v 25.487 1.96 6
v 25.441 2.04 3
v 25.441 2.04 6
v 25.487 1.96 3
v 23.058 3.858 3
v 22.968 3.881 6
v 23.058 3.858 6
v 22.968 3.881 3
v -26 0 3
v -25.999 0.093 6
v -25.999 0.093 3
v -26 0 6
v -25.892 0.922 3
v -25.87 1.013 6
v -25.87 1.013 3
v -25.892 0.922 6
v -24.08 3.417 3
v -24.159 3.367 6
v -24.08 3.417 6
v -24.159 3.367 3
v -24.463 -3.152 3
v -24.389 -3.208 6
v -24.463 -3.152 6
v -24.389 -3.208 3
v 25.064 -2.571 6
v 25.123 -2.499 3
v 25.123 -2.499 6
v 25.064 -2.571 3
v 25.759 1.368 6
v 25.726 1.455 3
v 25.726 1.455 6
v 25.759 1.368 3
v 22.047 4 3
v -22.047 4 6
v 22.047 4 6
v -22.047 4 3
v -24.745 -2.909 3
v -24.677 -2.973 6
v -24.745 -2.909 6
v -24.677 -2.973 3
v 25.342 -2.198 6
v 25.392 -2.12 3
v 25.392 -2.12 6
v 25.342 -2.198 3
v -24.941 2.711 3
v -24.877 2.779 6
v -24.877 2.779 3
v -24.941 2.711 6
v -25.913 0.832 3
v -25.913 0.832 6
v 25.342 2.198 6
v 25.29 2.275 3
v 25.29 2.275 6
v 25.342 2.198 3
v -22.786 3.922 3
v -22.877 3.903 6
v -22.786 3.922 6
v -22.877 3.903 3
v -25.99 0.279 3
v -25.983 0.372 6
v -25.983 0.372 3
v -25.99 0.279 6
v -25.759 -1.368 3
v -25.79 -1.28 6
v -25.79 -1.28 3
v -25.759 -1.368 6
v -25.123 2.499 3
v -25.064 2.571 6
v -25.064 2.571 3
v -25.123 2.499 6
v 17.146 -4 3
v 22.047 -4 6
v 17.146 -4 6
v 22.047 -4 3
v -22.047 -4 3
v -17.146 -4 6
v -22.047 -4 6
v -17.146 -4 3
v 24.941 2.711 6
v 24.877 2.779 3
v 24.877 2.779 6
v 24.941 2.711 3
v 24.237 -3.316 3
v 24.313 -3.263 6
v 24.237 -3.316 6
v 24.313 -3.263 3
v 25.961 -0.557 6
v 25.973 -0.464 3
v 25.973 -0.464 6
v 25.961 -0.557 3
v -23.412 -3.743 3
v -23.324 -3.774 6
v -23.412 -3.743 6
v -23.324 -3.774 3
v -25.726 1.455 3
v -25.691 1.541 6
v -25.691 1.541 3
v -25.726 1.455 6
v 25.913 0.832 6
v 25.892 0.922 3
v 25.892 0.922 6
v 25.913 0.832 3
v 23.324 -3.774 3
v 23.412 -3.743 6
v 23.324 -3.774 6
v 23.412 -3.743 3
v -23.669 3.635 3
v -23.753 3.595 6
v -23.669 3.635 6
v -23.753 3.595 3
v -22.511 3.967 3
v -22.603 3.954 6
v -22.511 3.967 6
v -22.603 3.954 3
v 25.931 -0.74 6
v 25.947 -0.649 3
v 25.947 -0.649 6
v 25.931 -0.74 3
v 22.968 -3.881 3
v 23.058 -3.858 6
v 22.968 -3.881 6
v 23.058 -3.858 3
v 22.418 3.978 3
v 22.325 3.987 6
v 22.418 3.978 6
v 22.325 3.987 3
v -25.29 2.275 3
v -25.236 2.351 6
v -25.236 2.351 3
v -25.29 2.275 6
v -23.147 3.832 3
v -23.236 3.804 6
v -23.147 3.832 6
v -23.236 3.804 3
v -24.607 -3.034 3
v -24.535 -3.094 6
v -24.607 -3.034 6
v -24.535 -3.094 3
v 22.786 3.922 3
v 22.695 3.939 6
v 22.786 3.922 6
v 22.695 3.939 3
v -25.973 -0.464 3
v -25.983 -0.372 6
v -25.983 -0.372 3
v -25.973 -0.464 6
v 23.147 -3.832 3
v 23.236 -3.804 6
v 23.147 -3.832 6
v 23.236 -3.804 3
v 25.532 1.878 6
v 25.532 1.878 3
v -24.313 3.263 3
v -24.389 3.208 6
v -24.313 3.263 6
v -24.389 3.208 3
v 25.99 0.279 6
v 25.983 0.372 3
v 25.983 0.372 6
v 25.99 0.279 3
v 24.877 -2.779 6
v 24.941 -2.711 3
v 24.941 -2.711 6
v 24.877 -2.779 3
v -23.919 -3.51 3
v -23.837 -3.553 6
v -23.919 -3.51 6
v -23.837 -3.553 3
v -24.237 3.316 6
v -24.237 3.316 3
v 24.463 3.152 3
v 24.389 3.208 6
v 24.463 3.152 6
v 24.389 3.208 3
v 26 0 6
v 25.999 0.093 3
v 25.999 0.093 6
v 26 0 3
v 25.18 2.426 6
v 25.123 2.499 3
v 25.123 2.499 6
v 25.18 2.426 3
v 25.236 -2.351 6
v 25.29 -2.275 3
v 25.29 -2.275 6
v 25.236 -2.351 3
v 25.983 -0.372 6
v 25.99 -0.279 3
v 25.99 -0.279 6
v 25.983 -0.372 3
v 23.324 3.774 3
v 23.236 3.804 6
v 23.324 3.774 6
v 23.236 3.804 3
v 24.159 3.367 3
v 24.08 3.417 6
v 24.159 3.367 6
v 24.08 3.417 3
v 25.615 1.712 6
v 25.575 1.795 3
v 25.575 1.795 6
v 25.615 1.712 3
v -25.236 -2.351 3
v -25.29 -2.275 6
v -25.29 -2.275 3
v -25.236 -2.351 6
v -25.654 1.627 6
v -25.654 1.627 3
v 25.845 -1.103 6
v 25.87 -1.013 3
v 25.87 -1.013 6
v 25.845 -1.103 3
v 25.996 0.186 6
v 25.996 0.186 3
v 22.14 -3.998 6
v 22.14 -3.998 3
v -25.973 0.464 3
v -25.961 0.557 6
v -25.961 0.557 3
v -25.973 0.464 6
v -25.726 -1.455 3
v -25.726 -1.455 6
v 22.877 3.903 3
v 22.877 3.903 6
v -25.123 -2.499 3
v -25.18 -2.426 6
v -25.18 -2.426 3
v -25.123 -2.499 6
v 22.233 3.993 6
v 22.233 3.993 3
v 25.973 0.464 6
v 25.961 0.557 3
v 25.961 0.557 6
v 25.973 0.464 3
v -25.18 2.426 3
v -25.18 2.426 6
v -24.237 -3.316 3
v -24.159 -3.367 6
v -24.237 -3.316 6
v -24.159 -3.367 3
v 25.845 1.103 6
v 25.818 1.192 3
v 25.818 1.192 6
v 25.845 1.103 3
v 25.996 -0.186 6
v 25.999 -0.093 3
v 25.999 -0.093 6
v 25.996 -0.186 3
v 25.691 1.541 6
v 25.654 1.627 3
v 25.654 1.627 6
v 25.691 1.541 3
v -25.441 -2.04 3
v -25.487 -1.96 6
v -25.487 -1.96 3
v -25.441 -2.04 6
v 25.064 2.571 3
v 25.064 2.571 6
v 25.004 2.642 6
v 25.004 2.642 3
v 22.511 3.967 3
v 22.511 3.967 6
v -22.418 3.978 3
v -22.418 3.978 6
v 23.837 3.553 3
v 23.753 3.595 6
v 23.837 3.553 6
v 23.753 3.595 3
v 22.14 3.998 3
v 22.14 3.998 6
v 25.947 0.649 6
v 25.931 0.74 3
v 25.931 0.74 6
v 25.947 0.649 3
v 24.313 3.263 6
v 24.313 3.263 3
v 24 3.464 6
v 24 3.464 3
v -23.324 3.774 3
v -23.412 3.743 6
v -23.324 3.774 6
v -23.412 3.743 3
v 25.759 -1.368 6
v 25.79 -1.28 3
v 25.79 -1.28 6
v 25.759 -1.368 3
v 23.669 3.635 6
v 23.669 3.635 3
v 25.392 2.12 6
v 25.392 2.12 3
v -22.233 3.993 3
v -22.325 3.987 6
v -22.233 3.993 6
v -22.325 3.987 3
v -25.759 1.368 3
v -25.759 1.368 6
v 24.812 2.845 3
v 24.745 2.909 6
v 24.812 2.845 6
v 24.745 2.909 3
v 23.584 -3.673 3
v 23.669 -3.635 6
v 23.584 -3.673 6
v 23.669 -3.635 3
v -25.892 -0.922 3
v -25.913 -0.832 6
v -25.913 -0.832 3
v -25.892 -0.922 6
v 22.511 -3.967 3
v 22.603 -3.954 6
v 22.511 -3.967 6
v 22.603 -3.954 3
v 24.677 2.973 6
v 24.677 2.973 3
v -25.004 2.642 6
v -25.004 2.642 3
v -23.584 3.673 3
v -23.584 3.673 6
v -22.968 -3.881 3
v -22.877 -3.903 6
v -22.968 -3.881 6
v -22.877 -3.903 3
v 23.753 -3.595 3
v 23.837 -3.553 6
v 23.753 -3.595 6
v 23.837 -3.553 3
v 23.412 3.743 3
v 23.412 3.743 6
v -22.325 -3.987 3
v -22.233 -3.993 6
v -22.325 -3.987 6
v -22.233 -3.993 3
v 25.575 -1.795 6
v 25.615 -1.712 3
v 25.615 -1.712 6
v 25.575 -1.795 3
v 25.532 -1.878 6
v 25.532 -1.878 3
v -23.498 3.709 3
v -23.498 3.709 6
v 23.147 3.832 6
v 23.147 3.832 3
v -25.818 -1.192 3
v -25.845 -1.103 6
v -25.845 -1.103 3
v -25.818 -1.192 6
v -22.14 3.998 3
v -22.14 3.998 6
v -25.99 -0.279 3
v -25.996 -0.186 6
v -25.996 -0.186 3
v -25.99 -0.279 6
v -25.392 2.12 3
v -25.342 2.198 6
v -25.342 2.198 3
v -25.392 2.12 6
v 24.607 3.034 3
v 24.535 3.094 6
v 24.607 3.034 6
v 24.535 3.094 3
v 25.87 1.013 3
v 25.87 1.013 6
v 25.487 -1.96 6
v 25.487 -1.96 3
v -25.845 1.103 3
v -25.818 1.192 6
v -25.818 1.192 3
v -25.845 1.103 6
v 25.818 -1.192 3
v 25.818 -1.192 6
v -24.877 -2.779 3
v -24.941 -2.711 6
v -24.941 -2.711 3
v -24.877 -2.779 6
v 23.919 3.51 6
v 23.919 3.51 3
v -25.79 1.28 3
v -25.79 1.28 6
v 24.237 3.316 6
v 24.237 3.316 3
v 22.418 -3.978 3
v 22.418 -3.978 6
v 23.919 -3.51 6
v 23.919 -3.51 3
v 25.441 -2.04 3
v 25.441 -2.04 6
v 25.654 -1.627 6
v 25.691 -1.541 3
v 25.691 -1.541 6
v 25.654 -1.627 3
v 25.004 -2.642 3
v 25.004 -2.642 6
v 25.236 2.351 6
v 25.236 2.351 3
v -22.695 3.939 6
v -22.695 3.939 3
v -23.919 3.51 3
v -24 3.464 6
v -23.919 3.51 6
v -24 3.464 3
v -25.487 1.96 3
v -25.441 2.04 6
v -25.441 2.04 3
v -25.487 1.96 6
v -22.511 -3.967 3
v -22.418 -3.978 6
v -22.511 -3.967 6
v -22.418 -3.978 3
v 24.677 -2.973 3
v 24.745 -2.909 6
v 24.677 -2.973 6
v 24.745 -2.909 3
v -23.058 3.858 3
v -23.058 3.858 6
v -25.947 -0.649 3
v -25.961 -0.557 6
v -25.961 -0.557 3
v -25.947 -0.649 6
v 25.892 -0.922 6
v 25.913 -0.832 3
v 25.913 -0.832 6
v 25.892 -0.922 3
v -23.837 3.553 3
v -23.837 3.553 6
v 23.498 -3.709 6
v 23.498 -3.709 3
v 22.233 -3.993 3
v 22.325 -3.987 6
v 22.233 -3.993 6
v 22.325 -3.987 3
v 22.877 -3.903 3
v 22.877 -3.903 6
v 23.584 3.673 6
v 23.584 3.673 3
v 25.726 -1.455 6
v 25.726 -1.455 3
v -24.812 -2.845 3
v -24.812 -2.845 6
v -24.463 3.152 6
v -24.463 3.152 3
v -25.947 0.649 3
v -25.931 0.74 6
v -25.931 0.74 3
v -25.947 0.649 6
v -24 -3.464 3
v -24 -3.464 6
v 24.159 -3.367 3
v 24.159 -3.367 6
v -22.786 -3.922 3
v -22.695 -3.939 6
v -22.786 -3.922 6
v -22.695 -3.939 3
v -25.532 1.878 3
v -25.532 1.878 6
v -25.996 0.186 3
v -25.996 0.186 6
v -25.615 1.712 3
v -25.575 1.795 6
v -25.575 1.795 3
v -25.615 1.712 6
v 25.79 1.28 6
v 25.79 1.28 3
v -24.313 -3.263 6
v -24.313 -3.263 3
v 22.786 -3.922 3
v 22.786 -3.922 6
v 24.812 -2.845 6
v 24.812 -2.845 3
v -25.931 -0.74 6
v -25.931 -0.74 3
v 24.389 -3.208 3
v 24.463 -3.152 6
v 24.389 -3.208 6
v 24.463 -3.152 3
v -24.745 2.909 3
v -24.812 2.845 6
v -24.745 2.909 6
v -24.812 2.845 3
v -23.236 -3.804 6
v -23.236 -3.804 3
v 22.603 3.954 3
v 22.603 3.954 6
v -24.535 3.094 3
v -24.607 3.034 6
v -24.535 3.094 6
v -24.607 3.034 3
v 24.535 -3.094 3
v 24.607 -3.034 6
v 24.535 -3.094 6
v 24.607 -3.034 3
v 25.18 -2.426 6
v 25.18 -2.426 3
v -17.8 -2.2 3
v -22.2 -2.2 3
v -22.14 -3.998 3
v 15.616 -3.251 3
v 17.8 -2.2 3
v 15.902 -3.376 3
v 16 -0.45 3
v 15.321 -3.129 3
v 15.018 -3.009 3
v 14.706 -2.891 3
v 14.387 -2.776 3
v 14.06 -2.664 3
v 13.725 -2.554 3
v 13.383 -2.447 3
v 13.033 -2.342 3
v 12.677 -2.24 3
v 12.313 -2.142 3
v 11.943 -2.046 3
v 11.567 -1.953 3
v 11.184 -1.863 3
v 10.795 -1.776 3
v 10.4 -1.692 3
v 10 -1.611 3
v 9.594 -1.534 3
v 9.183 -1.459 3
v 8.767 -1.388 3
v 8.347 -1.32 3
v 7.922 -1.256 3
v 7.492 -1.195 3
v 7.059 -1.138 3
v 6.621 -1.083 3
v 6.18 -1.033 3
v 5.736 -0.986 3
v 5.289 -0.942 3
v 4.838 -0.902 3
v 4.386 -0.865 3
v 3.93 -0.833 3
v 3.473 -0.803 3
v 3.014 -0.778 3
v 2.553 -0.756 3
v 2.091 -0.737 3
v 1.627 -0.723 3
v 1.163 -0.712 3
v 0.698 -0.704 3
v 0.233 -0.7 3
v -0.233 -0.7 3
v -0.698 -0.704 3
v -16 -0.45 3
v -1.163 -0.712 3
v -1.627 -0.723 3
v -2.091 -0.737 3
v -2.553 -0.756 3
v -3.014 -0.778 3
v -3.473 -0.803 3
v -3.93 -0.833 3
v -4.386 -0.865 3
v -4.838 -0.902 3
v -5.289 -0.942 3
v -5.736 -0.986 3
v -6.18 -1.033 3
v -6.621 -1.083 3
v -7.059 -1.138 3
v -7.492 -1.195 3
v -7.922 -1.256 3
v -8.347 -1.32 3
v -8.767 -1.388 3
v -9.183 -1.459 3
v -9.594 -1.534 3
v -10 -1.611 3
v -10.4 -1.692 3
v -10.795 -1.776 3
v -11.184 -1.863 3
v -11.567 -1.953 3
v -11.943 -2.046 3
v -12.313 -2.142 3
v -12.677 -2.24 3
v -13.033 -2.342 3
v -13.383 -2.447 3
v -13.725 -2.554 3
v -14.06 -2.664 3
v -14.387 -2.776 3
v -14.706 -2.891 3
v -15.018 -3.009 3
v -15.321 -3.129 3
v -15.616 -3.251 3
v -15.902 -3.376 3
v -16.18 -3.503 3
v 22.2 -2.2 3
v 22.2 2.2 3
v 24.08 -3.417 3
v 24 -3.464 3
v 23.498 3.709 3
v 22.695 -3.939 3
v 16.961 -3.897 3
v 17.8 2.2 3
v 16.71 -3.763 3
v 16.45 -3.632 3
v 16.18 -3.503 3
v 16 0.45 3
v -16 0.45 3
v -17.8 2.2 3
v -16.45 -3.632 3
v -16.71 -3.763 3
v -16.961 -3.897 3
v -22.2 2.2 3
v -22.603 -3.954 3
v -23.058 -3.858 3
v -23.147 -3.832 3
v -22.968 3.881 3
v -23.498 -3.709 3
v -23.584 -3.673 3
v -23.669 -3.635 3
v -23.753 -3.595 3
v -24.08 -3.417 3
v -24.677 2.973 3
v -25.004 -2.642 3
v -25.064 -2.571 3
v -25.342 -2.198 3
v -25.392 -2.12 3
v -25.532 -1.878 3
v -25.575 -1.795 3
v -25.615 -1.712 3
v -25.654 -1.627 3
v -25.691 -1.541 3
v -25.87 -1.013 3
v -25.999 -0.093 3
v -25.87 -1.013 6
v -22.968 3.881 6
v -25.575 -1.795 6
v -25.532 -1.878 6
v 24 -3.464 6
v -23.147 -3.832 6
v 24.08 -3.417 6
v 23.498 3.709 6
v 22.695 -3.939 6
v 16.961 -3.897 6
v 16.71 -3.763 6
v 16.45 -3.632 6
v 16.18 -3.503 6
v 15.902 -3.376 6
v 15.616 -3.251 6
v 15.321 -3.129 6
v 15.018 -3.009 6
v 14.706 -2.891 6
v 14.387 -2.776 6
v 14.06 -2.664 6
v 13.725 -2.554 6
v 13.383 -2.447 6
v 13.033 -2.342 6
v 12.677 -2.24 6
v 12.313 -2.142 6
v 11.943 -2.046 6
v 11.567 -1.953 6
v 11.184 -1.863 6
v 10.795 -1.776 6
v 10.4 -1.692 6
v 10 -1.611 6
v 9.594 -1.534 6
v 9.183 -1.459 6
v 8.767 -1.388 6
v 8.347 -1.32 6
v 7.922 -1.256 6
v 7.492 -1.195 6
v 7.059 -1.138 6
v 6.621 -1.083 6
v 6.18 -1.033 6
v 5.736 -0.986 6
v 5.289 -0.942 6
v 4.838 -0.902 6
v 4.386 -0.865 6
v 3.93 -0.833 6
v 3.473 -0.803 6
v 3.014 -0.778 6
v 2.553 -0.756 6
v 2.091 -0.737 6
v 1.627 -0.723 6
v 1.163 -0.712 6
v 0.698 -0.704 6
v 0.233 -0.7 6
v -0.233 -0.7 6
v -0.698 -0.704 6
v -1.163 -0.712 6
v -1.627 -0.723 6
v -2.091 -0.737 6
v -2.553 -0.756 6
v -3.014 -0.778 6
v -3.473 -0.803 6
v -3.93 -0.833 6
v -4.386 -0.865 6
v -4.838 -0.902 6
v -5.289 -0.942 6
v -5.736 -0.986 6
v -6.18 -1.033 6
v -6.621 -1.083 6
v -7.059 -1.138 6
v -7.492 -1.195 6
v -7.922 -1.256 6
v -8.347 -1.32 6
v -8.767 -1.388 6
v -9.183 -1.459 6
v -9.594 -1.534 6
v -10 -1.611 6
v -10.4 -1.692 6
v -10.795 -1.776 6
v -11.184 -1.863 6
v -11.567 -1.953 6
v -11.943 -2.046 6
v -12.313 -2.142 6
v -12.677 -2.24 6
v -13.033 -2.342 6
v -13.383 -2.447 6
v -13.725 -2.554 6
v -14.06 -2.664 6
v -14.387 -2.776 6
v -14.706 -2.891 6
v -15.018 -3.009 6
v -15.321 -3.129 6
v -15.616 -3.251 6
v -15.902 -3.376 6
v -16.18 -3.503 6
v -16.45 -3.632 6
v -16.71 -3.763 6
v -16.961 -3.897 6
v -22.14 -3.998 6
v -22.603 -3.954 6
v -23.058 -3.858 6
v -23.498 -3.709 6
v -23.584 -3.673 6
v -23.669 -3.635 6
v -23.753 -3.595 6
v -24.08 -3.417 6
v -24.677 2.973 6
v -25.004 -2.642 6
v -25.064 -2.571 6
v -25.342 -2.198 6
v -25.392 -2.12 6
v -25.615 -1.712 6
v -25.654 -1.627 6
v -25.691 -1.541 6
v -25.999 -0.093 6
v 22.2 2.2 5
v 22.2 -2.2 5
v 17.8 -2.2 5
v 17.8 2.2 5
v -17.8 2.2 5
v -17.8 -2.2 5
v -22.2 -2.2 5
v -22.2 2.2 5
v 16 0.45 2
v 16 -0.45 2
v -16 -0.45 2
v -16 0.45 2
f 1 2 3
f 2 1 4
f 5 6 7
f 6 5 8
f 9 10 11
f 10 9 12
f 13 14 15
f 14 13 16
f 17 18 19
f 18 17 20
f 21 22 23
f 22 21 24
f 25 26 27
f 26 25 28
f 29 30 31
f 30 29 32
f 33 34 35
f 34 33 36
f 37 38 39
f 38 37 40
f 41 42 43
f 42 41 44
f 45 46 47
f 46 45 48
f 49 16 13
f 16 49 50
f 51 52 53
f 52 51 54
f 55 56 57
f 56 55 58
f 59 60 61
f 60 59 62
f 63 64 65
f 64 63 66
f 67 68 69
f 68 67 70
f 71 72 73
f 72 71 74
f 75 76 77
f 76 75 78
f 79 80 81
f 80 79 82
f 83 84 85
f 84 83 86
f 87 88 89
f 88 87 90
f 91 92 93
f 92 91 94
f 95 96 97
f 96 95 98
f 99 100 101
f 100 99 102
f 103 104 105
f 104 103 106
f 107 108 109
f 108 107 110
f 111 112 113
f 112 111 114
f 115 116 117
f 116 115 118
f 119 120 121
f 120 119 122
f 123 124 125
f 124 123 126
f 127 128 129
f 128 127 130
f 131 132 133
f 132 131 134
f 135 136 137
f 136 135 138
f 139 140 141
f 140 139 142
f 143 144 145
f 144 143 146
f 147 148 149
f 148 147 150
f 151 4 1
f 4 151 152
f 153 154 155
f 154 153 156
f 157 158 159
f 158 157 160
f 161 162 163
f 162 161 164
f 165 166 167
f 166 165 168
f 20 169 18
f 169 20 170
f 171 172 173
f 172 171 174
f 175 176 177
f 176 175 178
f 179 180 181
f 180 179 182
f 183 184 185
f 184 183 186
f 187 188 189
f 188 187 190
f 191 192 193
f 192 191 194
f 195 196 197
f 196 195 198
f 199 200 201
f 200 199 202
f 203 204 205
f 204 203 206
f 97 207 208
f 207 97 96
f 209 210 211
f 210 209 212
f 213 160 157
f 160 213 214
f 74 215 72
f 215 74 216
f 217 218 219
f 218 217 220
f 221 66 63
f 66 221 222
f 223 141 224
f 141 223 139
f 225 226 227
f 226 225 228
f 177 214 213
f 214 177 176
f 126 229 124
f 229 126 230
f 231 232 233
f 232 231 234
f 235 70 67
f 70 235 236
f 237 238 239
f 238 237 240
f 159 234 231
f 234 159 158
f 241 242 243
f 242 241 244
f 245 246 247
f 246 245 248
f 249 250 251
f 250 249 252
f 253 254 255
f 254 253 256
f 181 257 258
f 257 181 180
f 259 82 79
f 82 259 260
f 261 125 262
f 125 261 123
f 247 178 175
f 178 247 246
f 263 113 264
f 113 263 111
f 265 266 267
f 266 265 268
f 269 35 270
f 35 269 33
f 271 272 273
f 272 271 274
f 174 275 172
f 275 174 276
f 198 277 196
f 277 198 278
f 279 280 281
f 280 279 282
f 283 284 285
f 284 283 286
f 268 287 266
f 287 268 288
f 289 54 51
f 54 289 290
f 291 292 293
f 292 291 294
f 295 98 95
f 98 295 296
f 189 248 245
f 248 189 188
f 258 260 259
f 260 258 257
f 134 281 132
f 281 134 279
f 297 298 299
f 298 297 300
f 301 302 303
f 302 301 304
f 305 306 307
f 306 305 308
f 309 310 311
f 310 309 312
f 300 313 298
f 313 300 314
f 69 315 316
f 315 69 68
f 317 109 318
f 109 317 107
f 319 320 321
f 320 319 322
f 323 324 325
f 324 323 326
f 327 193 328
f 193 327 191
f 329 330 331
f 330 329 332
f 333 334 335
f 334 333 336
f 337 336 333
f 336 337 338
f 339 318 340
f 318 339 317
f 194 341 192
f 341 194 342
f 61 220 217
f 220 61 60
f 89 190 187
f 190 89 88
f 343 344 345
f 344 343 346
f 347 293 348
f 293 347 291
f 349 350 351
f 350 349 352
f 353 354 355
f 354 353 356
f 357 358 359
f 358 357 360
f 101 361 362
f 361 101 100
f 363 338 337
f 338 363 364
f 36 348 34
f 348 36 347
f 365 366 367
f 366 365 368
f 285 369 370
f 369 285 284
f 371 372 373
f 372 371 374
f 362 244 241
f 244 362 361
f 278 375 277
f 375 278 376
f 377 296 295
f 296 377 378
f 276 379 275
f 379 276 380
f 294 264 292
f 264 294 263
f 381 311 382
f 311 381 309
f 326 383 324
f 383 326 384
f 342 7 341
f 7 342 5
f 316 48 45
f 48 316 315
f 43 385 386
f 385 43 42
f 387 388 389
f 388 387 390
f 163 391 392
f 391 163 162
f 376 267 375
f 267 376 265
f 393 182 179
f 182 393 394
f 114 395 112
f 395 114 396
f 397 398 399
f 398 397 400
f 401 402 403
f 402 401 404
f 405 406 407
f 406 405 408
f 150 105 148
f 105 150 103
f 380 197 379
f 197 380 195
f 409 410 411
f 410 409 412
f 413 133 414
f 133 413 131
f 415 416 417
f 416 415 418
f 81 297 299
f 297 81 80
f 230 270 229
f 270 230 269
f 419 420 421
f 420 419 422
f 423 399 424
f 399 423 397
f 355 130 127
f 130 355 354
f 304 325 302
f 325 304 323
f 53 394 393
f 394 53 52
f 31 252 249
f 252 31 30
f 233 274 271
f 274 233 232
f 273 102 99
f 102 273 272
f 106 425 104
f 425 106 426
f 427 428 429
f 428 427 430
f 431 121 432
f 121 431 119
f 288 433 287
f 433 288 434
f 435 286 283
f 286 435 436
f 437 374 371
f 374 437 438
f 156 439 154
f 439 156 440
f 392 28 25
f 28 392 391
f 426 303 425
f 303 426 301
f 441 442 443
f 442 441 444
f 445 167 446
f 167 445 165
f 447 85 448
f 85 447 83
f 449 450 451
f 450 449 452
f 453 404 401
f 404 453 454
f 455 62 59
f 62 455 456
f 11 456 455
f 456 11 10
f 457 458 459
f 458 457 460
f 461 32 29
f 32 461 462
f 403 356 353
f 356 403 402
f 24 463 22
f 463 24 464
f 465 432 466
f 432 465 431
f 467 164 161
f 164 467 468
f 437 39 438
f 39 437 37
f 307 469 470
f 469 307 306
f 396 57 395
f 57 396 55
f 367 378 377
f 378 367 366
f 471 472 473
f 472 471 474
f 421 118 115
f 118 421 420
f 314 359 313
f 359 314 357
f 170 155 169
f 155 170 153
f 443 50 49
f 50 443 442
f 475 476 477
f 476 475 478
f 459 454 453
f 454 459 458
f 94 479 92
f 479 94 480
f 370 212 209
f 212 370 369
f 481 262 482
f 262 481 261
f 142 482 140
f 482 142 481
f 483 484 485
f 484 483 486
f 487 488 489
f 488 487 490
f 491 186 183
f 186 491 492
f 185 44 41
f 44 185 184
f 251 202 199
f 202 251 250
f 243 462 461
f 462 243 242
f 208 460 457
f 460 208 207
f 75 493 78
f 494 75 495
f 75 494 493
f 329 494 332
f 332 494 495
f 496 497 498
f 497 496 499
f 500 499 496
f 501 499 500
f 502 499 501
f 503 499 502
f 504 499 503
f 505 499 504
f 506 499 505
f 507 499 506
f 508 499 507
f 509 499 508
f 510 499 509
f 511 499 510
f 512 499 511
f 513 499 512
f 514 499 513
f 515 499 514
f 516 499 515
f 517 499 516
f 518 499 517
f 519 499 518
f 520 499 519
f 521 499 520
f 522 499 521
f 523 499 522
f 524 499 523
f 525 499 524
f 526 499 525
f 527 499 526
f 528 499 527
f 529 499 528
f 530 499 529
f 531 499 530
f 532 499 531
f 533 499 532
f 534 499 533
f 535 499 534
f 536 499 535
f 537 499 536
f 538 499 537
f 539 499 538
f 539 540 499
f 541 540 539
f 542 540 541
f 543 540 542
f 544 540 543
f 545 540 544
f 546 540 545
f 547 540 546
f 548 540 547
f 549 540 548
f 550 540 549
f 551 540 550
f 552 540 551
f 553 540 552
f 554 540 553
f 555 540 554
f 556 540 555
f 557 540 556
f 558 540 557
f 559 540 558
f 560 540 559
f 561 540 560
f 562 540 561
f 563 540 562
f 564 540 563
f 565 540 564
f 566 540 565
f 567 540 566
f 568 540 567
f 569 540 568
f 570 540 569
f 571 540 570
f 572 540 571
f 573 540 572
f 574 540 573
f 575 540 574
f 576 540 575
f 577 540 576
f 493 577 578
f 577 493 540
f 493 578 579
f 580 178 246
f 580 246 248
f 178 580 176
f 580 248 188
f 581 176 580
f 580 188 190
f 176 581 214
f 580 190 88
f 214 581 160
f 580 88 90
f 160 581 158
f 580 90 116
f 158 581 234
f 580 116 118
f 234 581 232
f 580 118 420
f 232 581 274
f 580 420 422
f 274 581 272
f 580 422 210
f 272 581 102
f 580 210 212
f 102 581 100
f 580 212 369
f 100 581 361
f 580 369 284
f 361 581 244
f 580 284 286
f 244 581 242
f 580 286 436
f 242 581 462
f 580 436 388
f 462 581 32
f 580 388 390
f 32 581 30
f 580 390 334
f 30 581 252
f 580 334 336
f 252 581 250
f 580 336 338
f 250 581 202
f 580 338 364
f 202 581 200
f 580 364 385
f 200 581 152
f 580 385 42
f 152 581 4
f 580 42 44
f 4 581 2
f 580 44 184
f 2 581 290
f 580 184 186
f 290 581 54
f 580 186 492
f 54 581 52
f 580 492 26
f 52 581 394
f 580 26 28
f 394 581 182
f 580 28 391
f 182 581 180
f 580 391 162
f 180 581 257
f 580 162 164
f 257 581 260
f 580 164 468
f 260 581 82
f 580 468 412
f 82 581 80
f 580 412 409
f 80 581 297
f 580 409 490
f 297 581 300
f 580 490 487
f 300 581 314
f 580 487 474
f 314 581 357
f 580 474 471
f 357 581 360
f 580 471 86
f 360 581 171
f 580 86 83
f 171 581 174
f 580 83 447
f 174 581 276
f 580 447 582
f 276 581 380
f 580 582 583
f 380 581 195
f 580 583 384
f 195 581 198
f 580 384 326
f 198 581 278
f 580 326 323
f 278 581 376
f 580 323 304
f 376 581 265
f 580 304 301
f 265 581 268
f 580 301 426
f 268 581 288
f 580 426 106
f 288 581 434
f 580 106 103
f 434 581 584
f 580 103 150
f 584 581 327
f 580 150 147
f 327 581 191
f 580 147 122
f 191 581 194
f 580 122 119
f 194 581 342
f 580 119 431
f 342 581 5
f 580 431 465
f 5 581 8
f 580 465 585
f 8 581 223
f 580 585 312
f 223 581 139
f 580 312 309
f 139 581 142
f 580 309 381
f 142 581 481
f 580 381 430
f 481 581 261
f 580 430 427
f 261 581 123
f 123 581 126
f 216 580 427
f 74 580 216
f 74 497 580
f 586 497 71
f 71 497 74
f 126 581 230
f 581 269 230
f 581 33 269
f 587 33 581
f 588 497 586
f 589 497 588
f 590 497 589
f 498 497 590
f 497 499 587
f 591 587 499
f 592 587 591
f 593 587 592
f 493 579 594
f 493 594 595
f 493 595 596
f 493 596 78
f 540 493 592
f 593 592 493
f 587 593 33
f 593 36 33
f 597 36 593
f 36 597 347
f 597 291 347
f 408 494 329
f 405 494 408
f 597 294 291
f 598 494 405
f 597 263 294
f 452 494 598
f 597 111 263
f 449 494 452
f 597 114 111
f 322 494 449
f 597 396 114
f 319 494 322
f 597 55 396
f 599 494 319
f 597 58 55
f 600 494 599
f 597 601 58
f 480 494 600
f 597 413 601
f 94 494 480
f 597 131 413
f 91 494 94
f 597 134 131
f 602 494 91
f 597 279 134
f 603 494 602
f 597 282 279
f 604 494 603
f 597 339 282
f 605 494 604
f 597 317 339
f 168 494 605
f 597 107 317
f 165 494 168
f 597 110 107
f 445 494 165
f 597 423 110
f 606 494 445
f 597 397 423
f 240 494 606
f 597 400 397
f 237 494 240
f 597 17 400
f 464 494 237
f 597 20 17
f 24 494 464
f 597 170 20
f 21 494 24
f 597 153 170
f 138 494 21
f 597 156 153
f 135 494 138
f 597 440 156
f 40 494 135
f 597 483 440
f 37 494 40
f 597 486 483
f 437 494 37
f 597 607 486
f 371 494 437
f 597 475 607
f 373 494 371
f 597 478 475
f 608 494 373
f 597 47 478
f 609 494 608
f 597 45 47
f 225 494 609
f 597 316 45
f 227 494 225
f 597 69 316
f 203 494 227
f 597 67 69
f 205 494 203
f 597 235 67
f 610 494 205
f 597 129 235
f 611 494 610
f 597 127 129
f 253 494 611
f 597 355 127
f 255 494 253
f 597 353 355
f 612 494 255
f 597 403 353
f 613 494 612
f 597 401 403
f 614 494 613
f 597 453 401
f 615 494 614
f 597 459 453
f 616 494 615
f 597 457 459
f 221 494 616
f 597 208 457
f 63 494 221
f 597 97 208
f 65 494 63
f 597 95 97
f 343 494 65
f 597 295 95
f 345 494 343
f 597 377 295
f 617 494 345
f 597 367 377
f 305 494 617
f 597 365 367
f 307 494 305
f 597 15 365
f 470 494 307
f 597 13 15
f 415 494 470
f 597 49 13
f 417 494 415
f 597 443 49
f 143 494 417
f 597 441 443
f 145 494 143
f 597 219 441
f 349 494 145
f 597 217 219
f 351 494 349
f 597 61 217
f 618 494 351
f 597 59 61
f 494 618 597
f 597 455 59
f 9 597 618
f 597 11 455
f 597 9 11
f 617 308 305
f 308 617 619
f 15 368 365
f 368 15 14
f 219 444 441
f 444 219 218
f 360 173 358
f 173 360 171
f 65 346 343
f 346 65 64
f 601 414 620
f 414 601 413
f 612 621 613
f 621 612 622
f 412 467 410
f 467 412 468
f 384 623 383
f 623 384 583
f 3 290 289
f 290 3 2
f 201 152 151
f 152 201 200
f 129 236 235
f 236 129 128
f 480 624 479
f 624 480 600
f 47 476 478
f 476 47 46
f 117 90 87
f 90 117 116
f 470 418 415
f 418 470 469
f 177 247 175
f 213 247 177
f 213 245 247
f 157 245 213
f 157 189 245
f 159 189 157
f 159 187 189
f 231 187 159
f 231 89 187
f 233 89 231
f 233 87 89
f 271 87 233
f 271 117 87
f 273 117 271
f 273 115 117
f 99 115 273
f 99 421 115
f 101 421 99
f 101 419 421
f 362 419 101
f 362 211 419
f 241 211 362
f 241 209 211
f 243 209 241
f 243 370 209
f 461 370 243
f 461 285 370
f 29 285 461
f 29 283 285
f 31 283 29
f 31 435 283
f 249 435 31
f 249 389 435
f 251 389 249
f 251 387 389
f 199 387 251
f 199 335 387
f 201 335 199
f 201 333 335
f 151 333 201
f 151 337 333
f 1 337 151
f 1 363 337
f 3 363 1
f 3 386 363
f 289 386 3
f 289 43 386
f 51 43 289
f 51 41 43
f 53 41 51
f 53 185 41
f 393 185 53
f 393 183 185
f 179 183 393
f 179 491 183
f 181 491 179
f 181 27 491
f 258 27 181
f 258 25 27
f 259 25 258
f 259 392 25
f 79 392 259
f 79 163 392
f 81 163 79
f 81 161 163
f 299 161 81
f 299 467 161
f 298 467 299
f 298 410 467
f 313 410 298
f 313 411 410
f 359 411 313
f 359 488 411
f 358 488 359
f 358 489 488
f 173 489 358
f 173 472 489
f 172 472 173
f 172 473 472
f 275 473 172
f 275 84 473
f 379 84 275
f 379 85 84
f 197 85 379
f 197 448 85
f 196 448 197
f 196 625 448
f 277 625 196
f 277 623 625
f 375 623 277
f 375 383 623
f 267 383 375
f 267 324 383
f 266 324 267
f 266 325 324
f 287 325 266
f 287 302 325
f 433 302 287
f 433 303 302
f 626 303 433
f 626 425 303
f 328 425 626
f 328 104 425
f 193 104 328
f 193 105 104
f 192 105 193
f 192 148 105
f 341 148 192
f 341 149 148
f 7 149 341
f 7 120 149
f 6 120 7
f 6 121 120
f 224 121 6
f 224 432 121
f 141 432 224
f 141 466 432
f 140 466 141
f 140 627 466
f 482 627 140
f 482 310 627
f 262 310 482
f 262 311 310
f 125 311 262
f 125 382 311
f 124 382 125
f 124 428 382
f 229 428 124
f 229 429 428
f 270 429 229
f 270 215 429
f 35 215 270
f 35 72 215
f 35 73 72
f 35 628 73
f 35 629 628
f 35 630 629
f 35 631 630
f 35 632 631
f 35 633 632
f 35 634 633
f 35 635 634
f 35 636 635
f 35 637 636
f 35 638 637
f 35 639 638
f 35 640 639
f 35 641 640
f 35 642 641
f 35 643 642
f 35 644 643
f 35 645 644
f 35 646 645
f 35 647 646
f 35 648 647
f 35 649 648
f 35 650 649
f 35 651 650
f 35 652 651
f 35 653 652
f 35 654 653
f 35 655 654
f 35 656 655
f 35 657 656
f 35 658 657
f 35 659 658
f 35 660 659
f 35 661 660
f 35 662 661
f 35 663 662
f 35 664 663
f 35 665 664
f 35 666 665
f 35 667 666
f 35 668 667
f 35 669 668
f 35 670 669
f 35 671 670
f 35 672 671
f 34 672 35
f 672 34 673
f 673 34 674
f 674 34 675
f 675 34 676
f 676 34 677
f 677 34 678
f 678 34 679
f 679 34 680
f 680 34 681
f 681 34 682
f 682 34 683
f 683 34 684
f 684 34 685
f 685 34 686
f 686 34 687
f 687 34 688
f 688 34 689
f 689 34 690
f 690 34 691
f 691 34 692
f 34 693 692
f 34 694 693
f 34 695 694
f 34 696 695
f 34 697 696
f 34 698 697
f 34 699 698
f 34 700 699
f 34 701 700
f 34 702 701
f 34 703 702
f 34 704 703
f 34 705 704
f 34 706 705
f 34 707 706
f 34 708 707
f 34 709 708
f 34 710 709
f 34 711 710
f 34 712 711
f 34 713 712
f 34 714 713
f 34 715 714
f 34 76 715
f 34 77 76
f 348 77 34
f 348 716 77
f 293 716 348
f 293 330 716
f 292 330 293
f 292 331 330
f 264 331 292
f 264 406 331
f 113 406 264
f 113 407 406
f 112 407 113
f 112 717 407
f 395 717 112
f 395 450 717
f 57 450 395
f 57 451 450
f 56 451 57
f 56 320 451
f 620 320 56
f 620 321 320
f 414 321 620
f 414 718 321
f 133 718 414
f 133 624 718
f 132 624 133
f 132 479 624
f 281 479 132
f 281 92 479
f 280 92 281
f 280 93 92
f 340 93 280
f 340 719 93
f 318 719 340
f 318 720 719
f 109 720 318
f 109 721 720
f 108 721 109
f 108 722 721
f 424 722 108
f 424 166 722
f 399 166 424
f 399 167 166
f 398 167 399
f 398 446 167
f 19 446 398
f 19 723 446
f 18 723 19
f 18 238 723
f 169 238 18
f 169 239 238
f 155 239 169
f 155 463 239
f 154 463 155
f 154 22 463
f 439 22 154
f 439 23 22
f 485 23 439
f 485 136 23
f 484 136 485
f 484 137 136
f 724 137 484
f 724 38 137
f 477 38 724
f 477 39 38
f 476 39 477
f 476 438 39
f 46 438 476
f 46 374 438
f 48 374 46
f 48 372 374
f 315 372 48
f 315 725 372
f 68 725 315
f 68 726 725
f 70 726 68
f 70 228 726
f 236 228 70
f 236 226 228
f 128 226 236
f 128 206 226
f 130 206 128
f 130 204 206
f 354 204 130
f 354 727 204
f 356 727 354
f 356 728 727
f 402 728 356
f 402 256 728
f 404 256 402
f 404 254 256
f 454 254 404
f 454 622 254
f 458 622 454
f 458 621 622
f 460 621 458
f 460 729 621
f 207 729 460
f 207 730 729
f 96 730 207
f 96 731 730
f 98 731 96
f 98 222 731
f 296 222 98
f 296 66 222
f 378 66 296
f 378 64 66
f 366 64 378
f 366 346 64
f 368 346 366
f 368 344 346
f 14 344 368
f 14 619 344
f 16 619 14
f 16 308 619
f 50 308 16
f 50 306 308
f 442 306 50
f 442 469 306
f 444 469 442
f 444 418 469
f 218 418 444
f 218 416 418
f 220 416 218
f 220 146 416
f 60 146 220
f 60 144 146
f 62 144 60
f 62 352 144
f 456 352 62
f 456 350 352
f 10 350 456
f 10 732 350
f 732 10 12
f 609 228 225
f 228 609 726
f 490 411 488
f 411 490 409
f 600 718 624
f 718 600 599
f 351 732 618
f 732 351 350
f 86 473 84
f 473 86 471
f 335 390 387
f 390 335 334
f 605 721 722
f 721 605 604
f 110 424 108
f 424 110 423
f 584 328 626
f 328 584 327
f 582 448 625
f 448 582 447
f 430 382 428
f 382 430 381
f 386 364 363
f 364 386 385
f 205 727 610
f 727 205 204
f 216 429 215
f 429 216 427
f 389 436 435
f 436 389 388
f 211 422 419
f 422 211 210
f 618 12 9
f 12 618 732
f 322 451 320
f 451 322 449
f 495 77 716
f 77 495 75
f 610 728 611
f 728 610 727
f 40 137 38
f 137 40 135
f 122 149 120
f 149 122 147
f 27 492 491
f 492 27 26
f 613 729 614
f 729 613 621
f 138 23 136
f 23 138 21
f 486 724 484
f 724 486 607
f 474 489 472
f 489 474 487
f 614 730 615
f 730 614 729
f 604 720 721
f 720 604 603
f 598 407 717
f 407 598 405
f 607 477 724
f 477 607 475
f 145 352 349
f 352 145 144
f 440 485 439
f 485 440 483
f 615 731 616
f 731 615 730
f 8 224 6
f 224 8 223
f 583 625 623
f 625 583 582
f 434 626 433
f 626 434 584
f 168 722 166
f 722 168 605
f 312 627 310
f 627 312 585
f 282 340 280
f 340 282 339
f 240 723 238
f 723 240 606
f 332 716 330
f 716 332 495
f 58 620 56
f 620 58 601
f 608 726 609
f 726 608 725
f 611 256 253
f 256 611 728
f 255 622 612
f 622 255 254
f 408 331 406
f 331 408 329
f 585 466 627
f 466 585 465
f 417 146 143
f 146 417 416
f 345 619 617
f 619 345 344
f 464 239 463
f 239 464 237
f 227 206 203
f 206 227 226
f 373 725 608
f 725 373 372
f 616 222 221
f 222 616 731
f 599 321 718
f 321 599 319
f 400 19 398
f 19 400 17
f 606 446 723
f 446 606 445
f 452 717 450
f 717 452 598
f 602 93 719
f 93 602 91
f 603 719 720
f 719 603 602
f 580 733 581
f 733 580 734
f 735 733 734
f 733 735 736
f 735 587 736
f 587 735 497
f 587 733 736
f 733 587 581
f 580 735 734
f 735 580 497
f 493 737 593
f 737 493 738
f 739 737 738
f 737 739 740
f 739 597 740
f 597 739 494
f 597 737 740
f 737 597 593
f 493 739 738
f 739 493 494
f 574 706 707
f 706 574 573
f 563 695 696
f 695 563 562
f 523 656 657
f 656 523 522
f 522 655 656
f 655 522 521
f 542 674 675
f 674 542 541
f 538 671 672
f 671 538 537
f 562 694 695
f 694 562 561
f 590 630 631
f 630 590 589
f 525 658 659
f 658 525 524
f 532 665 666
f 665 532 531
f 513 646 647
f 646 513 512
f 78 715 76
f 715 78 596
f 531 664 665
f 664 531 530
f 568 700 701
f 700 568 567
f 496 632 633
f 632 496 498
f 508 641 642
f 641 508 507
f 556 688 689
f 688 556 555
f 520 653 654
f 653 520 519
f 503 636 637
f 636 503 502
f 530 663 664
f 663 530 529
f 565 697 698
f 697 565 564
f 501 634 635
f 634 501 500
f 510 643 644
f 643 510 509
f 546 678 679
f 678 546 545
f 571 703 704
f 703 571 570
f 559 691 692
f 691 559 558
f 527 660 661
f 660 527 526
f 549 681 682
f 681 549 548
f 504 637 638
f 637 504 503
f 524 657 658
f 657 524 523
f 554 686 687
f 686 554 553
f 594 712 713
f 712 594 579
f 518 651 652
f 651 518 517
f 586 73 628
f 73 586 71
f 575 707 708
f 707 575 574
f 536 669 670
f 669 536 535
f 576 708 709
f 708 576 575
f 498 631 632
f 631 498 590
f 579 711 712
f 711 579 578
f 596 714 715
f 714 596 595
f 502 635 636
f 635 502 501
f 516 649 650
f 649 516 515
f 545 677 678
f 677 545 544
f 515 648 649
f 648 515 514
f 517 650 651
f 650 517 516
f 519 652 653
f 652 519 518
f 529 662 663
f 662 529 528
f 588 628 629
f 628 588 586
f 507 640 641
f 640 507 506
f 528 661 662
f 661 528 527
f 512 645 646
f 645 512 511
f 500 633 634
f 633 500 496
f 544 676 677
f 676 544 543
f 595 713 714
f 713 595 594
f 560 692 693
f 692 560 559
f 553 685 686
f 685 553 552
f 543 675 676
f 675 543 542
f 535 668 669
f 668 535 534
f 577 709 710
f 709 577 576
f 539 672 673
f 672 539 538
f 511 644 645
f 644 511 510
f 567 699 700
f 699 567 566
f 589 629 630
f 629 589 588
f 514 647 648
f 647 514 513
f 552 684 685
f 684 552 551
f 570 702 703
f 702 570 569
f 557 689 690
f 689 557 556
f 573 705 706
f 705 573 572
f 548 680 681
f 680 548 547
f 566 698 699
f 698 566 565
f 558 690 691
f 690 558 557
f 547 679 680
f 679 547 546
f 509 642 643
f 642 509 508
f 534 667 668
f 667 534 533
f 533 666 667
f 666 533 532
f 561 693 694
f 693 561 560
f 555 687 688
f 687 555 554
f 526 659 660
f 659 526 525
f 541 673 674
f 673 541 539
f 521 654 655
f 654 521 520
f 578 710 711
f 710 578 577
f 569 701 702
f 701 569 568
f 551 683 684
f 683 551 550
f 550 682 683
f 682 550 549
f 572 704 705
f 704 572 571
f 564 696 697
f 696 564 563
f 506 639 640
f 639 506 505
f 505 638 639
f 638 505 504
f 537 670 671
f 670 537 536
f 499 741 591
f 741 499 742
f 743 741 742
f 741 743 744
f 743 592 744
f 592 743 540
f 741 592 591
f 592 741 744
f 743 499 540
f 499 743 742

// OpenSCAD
wW = 4;    // Thickness/Width of wood
mW = 4;    //                 of a Magnet-Cube
fW = 2;    // Thickness of the front plastic plate
sL = 80;   // sidelength of a triangle
bD = 80;   // Depth of a box (depth w.r.t. frontview)
fC = 3;    // number of fingers in the triangle
fD = 4;    // number on fingers downwards
pW = 12; //width of plug inlet
pD = 8; //depth of plug inlet
pS = 40; //shift from baseline of plug inlet
eW = 15; //larger ellipse width
hR=3; //Rounded con
// don't change these values
nC = 2*fC+2; //number of Divisions, due to 2fC+1 segments anC one segment that split in the corners
nD = 2*fD;
shortenSide = wW/tan(60)+wW;
sH = 2*(wW/tan(60)+wW/sin(60)); //shorten inner
Expl=0; //-1: closed, the larger the further apart
fnN = 270;
// concat with shfted rotated versions... bottom left right
/* // Bottom magnets from 
            translate([2*sL/nC,0,0.5])
            cube(size = [mW,mW,1], center = true);
            translate([-2*sL/nC,0,0.5])
            cube(size = [mW,mW,1], center = true);
*/
/* hull() {
   translate([-sL/4-wW/2,-wW/2,0]) circle(wW,$fn=360);
   translate([-sL/4-wW/2,wW/2,0]) circle(wW,$fn=360);
   translate([sL/4+wW/2,-wW/2,0]) circle(wW,$fn=360);
   translate([sL/4+wW/2,wW/2,0]) circle(wW,$fn=360);
};*/
difference() {
translate([0,0,3/4*wW])
    linear_extrude(3*wW/4)
    hull() {
    translate([-sL/4-wW/2,0,0])
    circle(wW,$fn=fnN);
    translate([+sL/4+wW/2,0,0])
    circle(wW,$fn=fnN);
    };
// Magnets
   translate([2*sL/nC,0,wW/2+1])
       cube(size = [1.1*mW,1.1*mW,wW], center = true);
   translate([-2*sL/nC,0,wW/2+1])
       cube(size = [1.1*mW,1.1*mW,wW], center = true);
   translate([0,-7.5])
    scale([2.5,.85,1])
    linear_extrude(2*wW)
    circle(8,$fn=fnN);
}

   # translate([0,0,wW-1.5])
        cube([sL/2-2*wW,.9,1],center=true);

echo(sL/2-2*wW);
